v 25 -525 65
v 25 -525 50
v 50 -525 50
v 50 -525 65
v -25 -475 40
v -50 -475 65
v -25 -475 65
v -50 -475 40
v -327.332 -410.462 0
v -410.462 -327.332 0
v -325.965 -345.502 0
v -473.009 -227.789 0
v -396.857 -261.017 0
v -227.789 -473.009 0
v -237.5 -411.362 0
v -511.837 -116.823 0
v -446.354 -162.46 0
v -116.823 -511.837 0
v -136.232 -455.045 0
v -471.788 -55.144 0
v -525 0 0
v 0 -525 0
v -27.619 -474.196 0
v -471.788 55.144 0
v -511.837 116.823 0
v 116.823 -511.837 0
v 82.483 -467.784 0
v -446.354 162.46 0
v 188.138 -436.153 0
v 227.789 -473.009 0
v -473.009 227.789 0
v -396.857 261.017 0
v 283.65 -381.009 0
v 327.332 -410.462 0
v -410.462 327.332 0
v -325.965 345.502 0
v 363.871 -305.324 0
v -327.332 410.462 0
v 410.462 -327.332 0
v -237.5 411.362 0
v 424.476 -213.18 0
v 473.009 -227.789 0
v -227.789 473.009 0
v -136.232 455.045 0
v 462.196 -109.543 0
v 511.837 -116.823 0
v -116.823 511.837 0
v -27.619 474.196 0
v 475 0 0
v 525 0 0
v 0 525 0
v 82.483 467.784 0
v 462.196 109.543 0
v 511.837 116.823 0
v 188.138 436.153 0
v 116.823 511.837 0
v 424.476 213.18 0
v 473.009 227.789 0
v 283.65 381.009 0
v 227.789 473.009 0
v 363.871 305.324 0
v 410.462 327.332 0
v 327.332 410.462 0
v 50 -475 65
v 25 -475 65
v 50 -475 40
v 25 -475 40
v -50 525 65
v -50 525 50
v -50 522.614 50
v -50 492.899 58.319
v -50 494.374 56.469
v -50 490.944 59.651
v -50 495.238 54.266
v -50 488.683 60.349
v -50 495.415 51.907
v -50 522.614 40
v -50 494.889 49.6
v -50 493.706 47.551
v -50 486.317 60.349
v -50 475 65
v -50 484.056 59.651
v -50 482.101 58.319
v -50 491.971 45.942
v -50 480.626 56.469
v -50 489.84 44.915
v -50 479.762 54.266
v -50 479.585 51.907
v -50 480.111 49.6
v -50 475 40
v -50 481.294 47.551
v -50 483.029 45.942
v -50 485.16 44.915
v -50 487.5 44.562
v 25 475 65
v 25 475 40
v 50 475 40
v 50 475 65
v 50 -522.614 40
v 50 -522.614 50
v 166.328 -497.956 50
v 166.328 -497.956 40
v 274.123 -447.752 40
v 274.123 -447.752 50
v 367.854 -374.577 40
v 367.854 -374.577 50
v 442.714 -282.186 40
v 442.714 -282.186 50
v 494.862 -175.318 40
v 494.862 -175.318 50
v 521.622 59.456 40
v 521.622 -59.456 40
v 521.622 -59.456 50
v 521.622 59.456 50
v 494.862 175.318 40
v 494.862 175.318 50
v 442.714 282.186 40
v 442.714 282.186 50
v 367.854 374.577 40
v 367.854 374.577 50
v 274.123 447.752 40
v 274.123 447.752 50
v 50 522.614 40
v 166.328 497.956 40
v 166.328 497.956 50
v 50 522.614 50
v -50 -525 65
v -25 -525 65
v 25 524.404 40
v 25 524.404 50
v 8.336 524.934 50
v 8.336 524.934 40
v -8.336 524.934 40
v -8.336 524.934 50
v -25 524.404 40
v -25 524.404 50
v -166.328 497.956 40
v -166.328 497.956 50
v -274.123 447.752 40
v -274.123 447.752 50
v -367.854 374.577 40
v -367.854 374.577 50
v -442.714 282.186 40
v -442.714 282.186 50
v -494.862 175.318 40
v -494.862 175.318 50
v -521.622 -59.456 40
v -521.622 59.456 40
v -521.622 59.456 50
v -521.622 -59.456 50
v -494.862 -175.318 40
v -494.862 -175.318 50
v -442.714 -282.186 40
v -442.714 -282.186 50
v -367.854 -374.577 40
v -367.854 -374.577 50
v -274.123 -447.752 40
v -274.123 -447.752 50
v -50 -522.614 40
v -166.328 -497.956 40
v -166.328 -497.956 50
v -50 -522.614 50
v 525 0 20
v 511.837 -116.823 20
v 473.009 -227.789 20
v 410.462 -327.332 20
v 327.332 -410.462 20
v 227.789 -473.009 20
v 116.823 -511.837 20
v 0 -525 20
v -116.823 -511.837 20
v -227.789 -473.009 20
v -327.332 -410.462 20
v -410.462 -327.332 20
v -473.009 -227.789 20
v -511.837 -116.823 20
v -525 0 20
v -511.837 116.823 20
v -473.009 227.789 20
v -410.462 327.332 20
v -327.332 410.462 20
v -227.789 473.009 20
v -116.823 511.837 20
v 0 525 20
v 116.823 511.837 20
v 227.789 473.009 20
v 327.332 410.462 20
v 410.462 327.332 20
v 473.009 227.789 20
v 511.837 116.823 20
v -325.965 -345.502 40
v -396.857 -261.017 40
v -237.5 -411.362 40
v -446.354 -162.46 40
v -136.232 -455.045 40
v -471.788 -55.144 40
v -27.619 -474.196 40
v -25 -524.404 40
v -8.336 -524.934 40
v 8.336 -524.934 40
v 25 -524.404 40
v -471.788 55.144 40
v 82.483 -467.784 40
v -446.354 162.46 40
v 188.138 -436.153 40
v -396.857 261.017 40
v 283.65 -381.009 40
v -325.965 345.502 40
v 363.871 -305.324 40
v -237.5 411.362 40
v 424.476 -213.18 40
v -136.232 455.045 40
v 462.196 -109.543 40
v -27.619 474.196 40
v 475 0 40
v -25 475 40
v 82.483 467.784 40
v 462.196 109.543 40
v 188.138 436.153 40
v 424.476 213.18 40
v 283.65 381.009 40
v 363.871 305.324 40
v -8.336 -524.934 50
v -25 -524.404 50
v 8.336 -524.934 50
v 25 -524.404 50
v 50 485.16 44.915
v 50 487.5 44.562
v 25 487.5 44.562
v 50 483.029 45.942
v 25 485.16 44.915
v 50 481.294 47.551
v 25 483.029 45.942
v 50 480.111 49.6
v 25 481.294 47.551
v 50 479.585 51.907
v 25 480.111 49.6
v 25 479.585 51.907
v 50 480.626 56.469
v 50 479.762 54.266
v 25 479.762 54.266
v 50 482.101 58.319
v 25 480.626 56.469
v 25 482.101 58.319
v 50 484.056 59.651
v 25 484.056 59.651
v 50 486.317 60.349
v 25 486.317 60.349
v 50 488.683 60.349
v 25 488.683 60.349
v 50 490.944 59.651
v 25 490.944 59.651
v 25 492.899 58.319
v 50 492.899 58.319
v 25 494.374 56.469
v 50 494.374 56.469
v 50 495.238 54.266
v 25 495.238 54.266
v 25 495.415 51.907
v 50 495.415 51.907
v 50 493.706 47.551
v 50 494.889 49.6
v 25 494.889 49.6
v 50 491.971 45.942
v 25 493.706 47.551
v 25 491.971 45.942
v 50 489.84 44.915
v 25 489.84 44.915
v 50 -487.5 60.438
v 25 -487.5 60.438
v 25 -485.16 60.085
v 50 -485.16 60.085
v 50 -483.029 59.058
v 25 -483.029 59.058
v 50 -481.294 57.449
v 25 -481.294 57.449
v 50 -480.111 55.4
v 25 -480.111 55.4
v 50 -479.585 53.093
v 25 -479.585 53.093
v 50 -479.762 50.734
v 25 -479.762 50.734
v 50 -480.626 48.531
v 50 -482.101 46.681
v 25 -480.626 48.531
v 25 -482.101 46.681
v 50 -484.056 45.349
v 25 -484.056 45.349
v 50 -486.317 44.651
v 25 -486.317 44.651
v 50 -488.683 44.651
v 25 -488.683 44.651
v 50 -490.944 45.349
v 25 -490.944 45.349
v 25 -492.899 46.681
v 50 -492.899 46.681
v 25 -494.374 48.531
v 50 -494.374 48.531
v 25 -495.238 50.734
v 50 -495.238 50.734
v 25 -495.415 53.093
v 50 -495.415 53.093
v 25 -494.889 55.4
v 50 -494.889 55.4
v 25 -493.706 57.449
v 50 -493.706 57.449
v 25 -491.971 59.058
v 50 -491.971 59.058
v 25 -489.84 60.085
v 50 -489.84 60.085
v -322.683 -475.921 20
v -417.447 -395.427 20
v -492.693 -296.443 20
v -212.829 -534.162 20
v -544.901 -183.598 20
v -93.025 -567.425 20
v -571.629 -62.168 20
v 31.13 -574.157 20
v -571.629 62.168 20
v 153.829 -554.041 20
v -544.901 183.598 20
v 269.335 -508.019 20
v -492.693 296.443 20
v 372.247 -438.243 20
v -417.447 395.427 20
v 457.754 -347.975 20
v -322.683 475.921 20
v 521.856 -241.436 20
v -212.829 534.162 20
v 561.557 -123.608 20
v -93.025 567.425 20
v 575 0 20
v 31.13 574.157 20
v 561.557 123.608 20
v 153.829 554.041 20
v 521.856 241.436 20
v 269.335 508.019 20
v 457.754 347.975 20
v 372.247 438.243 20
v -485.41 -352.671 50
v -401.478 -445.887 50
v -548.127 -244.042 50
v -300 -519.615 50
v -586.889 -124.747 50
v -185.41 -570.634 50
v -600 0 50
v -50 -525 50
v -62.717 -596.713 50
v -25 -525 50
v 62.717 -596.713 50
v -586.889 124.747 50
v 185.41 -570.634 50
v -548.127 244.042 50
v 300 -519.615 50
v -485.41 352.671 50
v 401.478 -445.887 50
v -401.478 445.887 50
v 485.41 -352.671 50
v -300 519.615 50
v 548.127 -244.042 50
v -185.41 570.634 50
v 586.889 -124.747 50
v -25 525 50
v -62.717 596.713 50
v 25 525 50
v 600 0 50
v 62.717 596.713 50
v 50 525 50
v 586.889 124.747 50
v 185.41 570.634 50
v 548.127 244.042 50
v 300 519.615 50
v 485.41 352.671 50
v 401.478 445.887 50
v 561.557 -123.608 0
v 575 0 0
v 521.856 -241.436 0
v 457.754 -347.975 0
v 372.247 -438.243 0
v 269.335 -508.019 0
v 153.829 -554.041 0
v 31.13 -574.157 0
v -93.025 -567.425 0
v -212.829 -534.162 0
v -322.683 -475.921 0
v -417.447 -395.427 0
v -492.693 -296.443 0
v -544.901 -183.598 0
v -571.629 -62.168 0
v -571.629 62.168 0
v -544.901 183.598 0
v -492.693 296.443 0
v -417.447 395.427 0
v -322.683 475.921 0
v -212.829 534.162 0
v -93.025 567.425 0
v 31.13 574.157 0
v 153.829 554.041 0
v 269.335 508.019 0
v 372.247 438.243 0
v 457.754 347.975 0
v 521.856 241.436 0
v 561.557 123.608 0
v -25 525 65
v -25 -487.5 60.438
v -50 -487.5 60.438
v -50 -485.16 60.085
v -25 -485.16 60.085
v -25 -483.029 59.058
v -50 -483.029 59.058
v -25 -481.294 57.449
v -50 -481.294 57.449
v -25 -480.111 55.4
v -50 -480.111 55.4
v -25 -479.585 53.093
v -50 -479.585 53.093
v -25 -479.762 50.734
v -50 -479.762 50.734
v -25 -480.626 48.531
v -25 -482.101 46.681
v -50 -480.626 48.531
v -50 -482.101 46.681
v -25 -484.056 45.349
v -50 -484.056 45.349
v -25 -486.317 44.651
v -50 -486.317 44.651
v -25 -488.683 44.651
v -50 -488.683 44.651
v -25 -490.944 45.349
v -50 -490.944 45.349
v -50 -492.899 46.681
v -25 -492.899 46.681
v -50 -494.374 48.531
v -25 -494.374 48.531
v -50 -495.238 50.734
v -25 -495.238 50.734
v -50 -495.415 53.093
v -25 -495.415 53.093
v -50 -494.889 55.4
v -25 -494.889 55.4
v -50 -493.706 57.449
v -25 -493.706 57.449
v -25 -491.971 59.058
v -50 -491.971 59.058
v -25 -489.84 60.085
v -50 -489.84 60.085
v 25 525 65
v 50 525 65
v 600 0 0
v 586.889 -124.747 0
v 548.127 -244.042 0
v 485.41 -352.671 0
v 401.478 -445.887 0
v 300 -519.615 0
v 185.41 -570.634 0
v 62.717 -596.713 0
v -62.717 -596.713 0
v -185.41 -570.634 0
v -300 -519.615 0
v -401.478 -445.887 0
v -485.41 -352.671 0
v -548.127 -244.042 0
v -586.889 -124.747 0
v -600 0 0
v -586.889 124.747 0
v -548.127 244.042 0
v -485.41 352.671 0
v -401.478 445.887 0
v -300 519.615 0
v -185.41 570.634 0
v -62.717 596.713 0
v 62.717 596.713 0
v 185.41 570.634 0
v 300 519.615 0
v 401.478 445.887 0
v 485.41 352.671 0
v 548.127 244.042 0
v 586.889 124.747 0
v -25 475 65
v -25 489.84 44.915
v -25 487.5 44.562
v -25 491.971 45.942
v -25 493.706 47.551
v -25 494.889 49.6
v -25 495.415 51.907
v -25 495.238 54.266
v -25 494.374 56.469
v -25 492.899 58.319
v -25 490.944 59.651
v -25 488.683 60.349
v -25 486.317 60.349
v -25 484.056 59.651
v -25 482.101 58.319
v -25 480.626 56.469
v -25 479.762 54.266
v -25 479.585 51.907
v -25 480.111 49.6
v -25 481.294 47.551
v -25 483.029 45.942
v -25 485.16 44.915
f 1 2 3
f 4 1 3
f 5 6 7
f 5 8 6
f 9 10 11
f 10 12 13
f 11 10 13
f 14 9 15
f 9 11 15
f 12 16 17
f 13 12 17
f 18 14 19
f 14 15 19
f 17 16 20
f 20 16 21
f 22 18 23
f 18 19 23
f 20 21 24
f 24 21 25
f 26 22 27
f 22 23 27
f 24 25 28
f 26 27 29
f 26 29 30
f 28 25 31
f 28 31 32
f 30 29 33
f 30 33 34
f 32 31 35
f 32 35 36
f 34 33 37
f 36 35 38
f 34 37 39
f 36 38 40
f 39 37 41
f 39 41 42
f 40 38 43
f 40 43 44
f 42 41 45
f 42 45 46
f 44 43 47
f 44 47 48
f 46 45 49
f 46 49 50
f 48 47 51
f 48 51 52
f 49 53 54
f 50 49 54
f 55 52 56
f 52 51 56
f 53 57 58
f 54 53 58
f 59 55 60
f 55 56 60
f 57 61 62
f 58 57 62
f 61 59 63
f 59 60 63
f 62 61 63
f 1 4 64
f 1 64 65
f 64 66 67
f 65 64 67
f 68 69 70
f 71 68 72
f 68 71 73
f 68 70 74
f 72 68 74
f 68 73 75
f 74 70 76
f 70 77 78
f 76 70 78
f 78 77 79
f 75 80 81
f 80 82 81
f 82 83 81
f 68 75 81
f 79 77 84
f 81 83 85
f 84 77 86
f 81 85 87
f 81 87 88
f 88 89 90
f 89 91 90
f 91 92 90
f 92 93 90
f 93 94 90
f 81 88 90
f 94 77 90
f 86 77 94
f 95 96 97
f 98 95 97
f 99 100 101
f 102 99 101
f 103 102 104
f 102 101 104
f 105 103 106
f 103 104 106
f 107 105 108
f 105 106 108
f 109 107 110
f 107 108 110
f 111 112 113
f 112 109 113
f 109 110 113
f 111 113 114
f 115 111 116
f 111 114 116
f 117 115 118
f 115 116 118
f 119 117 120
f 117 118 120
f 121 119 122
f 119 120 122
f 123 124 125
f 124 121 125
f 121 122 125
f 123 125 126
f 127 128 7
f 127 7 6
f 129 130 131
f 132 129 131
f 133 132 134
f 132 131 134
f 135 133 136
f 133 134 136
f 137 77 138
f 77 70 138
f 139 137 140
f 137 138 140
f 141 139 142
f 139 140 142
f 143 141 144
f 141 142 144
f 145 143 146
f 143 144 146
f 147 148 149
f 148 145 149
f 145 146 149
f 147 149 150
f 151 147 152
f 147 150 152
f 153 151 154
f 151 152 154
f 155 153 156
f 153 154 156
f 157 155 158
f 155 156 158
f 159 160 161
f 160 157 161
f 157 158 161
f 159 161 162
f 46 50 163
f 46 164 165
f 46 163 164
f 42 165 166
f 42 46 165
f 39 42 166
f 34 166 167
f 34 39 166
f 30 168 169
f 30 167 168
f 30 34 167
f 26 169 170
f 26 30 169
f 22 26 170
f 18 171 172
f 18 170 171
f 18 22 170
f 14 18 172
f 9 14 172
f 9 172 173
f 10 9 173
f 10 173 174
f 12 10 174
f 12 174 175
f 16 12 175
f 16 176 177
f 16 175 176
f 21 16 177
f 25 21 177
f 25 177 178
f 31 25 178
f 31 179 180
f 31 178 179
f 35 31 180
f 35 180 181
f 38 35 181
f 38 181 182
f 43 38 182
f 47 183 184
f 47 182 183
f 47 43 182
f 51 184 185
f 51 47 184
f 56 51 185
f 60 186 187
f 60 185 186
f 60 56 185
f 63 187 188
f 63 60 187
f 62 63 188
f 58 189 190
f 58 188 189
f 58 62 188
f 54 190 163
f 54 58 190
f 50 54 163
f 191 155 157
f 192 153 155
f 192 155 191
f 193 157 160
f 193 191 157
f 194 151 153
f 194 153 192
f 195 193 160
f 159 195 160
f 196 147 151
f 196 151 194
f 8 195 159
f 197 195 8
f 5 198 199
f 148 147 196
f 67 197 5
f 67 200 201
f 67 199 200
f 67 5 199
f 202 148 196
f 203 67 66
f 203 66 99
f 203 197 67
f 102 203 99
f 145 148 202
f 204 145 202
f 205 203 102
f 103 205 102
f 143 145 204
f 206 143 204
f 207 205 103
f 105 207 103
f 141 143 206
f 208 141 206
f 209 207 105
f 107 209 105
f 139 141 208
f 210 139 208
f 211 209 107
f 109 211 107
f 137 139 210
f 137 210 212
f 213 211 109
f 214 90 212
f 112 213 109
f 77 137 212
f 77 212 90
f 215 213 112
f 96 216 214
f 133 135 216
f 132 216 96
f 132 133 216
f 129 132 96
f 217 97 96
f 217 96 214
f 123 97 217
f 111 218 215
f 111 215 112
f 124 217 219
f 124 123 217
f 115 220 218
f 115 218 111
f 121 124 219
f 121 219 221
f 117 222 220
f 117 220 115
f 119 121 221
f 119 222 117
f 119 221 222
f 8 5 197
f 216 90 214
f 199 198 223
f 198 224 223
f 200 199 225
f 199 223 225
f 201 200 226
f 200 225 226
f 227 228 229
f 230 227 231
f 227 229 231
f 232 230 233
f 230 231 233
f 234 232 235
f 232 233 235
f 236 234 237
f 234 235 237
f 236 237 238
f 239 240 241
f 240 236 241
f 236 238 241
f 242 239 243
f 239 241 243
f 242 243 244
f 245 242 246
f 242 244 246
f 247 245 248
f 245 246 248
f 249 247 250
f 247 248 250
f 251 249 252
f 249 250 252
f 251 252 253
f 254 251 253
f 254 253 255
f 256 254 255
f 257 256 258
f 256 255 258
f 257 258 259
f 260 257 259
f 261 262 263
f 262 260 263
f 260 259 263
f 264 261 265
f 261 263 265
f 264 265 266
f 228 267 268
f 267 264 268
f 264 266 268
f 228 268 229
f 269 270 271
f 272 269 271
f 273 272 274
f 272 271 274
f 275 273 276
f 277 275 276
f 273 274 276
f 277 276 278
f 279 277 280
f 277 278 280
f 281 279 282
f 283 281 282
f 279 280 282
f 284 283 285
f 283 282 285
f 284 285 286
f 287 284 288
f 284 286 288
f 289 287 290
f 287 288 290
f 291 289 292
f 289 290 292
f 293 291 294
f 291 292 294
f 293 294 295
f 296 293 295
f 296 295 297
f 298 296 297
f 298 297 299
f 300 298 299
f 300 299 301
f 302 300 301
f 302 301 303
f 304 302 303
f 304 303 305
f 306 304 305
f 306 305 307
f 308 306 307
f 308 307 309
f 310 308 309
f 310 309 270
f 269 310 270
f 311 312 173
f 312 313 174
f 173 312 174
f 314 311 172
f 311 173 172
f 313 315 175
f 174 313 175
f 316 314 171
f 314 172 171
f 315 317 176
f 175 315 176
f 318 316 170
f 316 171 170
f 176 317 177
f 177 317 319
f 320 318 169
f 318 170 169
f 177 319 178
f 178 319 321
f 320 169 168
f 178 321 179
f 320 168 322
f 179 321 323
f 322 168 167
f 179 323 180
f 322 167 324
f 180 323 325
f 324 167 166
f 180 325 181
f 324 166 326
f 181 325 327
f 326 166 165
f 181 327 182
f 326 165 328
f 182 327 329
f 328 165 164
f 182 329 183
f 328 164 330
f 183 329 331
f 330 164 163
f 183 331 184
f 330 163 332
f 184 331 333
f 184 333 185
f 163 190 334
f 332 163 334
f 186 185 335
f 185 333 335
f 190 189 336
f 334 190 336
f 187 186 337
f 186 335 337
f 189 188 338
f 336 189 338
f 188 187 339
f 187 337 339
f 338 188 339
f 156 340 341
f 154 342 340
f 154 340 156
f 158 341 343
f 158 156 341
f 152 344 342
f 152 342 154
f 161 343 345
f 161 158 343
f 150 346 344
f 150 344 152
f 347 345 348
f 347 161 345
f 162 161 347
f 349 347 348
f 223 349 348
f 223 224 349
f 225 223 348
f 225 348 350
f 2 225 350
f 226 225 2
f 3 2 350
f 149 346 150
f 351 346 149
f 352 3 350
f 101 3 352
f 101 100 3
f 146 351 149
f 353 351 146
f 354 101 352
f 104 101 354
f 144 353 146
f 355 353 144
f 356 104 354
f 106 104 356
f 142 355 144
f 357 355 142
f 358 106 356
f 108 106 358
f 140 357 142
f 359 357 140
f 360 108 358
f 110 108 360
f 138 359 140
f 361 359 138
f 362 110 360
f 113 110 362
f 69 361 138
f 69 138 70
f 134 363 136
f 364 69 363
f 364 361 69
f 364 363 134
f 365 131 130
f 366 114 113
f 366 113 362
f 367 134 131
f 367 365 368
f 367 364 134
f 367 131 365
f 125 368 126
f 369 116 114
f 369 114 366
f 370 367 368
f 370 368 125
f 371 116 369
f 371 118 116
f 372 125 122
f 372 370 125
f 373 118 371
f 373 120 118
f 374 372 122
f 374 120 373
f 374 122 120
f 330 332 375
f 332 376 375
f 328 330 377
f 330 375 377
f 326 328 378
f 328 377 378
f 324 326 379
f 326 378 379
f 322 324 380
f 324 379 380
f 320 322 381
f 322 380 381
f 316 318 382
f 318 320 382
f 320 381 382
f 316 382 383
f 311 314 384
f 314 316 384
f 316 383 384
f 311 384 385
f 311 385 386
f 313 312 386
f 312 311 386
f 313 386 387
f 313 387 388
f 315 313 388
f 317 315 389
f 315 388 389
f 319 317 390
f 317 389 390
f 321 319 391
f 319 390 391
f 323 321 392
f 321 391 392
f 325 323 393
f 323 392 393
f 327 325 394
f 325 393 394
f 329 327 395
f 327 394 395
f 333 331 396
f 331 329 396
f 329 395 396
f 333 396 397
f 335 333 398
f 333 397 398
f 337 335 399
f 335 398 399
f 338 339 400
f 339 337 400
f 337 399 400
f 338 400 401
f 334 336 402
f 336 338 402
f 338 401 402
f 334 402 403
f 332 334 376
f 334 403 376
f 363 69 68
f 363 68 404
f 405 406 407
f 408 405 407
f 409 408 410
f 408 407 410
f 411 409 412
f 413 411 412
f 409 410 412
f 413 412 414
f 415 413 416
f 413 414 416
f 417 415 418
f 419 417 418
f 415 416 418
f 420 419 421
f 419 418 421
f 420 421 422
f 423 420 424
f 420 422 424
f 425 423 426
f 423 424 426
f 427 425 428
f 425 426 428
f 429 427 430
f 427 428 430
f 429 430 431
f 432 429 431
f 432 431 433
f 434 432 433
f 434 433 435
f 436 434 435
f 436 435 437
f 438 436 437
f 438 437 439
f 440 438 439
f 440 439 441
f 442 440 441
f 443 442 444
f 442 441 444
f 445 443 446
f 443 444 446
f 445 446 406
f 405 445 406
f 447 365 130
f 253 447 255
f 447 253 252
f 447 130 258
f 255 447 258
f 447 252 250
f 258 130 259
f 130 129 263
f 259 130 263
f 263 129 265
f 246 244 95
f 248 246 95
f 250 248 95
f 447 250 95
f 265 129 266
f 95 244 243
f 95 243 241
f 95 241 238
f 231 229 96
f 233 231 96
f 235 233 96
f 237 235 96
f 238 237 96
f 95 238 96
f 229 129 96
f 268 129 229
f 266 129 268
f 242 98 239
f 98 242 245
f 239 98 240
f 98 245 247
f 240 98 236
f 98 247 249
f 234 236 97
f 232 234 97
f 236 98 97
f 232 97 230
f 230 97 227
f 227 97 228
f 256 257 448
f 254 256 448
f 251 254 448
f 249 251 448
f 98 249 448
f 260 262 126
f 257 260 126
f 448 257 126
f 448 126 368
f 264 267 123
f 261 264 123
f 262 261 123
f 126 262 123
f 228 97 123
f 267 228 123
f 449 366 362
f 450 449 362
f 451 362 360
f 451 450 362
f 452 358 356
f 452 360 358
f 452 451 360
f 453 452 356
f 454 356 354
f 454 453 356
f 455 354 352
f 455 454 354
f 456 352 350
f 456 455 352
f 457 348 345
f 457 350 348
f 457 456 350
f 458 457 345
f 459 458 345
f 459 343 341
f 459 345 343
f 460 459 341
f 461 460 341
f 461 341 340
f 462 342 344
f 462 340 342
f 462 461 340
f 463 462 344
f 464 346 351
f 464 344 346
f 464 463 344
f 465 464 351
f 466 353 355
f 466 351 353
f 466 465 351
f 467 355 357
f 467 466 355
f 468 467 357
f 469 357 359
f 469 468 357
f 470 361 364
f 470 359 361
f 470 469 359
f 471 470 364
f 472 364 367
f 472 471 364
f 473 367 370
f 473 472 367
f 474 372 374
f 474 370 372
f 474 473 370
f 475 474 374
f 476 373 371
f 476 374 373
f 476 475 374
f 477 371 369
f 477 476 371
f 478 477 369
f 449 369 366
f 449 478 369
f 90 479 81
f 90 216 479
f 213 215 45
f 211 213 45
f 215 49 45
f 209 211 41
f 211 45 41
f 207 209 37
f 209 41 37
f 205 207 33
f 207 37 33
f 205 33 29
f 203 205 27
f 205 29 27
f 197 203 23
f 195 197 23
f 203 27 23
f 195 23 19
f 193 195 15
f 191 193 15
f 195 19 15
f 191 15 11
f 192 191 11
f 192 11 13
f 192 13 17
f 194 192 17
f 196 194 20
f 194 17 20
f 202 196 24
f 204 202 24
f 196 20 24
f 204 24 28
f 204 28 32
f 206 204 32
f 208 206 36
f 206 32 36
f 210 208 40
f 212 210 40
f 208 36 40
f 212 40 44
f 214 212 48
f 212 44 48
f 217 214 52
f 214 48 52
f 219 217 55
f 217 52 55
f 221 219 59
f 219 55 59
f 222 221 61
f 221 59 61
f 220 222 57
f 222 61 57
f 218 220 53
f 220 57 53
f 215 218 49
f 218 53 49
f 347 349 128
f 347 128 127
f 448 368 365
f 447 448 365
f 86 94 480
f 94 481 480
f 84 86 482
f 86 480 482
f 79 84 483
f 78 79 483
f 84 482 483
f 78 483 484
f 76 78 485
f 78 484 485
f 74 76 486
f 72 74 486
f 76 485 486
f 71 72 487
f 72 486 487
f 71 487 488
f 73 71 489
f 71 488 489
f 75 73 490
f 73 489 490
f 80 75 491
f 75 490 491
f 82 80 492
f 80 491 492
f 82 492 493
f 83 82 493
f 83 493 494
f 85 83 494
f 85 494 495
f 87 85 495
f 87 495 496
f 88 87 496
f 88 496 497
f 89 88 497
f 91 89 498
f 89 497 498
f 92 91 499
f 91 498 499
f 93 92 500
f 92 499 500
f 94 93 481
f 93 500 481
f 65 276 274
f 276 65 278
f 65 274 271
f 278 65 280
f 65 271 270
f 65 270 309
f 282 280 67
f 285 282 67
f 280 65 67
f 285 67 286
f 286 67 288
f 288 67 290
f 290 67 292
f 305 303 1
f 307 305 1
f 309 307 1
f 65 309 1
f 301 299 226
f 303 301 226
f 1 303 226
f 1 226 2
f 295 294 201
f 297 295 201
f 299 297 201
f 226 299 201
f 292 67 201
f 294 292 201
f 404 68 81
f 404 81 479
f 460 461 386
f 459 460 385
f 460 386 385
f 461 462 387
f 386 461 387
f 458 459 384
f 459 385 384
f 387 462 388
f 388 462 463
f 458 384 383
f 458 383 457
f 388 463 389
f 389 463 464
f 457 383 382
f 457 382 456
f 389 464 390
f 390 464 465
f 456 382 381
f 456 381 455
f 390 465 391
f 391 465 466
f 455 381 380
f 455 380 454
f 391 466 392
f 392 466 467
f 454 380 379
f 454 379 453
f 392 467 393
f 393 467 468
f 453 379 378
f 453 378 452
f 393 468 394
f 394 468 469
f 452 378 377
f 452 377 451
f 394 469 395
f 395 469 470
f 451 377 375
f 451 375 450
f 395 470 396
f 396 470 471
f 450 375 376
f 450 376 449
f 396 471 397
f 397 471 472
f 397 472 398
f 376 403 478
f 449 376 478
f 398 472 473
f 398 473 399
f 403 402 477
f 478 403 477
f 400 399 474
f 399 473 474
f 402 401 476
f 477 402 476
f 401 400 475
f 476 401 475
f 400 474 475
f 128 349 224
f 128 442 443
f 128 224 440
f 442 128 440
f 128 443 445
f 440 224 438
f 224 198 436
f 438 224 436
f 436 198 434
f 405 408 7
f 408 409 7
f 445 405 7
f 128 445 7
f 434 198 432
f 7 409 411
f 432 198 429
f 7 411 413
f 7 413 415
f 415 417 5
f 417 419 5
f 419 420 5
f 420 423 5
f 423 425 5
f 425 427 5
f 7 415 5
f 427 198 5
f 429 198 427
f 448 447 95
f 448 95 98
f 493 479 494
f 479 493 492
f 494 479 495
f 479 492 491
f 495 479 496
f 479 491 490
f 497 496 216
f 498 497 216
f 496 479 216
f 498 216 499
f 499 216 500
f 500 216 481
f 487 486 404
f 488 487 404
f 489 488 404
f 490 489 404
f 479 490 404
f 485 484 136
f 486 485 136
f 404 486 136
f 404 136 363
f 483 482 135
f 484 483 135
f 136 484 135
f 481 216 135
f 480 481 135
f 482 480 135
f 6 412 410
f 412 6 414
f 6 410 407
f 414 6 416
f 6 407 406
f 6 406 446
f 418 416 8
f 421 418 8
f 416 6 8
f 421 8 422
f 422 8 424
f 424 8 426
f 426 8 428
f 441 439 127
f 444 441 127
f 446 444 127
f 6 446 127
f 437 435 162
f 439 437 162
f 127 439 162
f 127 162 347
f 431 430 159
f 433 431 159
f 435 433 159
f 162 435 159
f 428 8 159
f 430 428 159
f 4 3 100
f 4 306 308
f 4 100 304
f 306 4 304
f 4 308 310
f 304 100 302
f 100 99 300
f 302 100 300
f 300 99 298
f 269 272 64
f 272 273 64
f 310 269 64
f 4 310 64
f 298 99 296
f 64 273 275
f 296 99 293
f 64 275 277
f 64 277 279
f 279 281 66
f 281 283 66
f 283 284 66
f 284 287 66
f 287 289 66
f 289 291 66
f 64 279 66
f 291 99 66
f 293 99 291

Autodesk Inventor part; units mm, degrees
ref_plane "YZ Plane" through (0, 0, 0) normal (1, 0, 0) x (0, 1, 0)
ref_plane "XZ Plane" through (0, 0, 0) normal (0, 1, 0) x (-1, 0, 0)
ref_plane "XY Plane" through (0, 0, 0) normal (0, 0, 1) x (1, 0, 0)
sketch "Sketch1" plane through (0, 0, 0) normal (0, 0, 1) x (1, 0, 0)
  circle A0 centre (0, 0) radius 600
  circle A1 centre (0, 0) radius 575
  circle A2 centre (0, 0) radius 525
  circle A3 centre (0, 0) radius 475
  dimension "d2" = 1200
  dimension "d1" = 1150
  dimension "d0" = 1050
  dimension "d9" = 950
extrude "Extrusion1" add sketch "Sketch1" along normal blind 50 contours A0 | A1 | A2 | A3
extrude "Extrusion2" cut sketch "Sketch1" along normal blind 20 contours A1
extrude "Extrusion3" cut sketch "Sketch1" along normal blind 315.5 contours A3
sketch "Sketch3" plane through (0, 0, 0) normal (0, 0, 1) x (1, 0, 0)
  circle A0 centre (0, 0) radius 475 projected
  line L0 (475, 0) -> (525, 0)
  circle A1 centre (0, 0) radius 525 projected
  line L1 (500, 0) -> (500, 50)
  line L2 (500, 50) -> (430, 50)
  line L3 (430, 50) -> (430, -50)
  line L4 (430, -50) -> (500, -50)
  line L5 (500, -50) -> (500, 50)
  line L6 (0, -117.9134) -> (0, 153.6807)
  line L7 (-500, 50) -> (-430, 50)
  line L8 (-430, 50) -> (-430, -50)
  line L9 (-430, -50) -> (-500, -50)
  line L10 (-500, -50) -> (-500, 50)
  line L11 (465, 0) -> (465, 25)
  line L12 (465, 25) -> (-465, 25)
  line L13 (-465, 25) -> (-465, -25)
  line L14 (-465, -25) -> (465, -25)
  line L15 (465, -25) -> (465, 25)
  point P0 (472.3611, -50)
  point P1 (472.3611, 50)
  point P2 (430, -25)
  point P3 (430, 25)
  point P4 (-430, -25)
  point P5 (-430, 25)
  dimension "d12" = 50
  dimension "d13" = 70
  dimension "d14" = 100
  dimension "d17" = 50
extrude "Extrusion4" [suppressed]
sketch "Sketch4" plane through (-472.3611, 50, 0) normal (0, 1, 0) x (1, 0, 0)
  line L0 (42.3611, 0) -> (42.3611, -50) projected
  line L1 (42.3611, -50) -> (24.8611, -50) construction
  line L2 (42.3611, -50) -> (0, -50) projected
  line L3 (24.8611, -50) -> (24.8611, -25) construction
  line L4 (42.3611, 0) -> (0, 0) projected
  line L5 (24.8611, -50) -> (49.8611, -50) construction
  circle A0 centre (24.8611, -25) radius 7.9375
  point P0 (472.3611, 0)
  dimension "d18" = 17.5
  dimension "d19" = 25
  dimension "d20" = 90
  dimension "d21" = 15.875
extrude "Extrusion5" [suppressed]
sketch "Sketch5" plane through (430, 50, 0) normal (0, 1, 0) x (1, 0, 0)
  line L0 (42.3611, -50) -> (0, -50) projected
  line L1 (0, -50) -> (0, -25) construction
  line L2 (0, 0) -> (0, -50) projected
  line L3 (42.3611, 0) -> (42.3611, -50) projected
  line L4 (0, -25) -> (21.1805, -25) construction
  circle A0 centre (21.1805, -25) radius 7.9375
  point P0 (-430, 0)
  dimension "d25" = 21.1806
  dimension "d26" = 15.875
extrude "Extrusion6" [suppressed]
sketch "Sketch6" plane through (0, 0, 50) normal (0, 0, 1) x (1, 0, 0)
  circle A0 centre (0, 0) radius 525
extrude "Extrusion7" cut sketch "Sketch6" against normal blind 10
sketch "Sketch7" plane through (0, 0, 40) normal (0, 0, 1) x (1, 0, 0)
  circle A0 centre (0, 0) radius 475 projected
  circle A1 centre (0, 0) radius 600 projected
  line L0 (0, 475) -> (-290.4738, 475)
  line L1 (-290.4738, 475) -> (-290.4738, 525)
  line L2 (-290.4738, 525) -> (0, 525)
  line L3 (0, 525) -> (0, 475)
  line L4 (0, 475) -> (291, 475)
  line L5 (291, 475) -> (291, 525)
  line L6 (291, 525) -> (0, 525)
  line L7 (0, 525) -> (0, 475)
  line L8 (0, 475) -> (25, 475)
  line L9 (25, 475) -> (0, 475)
  line L10 (0, 475) -> (-25, 475)
  line L11 (-50, 475) -> (-25, 475)
  line L12 (-25, 475) -> (-25, 525)
  line L13 (-25, 525) -> (-50, 525)
  line L14 (-50, 525) -> (-50, 475)
  line L15 (25, 475) -> (50, 475)
  line L16 (50, 475) -> (50, 525)
  line L17 (50, 525) -> (25, 525)
  line L18 (25, 525) -> (25, 475)
  dimension "d31" = 50
  dimension "d32" = 50
  dimension "d33" = 25
  dimension "d34" = 25
  dimension "d35" = 25
  dimension "d36" = 25
  dimension "d37" = 50
  dimension "d38" = 25
  dimension "d39" = 50
extrude "Extrusion8" add sketch "Sketch7" along normal blind 25 contours L0 L14 L2 L12 | L18 L6 L16 L4
sketch "Sketch8" plane through (-25, 475, 40) normal (1, 0, 0) x (0, 0, -1)
  line L0 (-25, 0) -> (-12.5, 0) construction
  line L1 (-12.5, 0) -> (-12.5, 12.5) construction
  circle A0 centre (-12.5, 12.5) radius 7.9375
  point P0 (40, -475)
  dimension "d42" = 12.5
  dimension "d43" = 12.5
  dimension "d44" = 15.875
extrude "Extrusion9" cut sketch "Sketch8" along normal blind 75 and the other way blind 25
mirror "Mirror1" about plane through (0, 0, 0) normal (0, 1, 0) of "Extrusion8"
sketch "Sketch9" plane through (-50, -525, 65) normal (-1, 0, 0) x (0, 0, 1)
  line L0 (-25, 50) -> (0, 50) projected
  line L1 (0, 50) -> (-12.5, 50) construction
  line L2 (-12.5, 50) -> (-12.5, 37.5) construction
  line L3 (-25, 50) -> (-25, 0.5956) projected
  line L4 (-12.5, 50) -> (0, 50) construction
  circle A0 centre (-12.5, 37.5) radius 7.9375
  point P0 (-65, 525)
  dimension "d49" = 12.5
  dimension "d50" = 90
  dimension "d51" = 15.875
extrude "Extrusion10" cut sketch "Sketch9" against normal up to surface (100 mm away)
properties part number "Top opening"
